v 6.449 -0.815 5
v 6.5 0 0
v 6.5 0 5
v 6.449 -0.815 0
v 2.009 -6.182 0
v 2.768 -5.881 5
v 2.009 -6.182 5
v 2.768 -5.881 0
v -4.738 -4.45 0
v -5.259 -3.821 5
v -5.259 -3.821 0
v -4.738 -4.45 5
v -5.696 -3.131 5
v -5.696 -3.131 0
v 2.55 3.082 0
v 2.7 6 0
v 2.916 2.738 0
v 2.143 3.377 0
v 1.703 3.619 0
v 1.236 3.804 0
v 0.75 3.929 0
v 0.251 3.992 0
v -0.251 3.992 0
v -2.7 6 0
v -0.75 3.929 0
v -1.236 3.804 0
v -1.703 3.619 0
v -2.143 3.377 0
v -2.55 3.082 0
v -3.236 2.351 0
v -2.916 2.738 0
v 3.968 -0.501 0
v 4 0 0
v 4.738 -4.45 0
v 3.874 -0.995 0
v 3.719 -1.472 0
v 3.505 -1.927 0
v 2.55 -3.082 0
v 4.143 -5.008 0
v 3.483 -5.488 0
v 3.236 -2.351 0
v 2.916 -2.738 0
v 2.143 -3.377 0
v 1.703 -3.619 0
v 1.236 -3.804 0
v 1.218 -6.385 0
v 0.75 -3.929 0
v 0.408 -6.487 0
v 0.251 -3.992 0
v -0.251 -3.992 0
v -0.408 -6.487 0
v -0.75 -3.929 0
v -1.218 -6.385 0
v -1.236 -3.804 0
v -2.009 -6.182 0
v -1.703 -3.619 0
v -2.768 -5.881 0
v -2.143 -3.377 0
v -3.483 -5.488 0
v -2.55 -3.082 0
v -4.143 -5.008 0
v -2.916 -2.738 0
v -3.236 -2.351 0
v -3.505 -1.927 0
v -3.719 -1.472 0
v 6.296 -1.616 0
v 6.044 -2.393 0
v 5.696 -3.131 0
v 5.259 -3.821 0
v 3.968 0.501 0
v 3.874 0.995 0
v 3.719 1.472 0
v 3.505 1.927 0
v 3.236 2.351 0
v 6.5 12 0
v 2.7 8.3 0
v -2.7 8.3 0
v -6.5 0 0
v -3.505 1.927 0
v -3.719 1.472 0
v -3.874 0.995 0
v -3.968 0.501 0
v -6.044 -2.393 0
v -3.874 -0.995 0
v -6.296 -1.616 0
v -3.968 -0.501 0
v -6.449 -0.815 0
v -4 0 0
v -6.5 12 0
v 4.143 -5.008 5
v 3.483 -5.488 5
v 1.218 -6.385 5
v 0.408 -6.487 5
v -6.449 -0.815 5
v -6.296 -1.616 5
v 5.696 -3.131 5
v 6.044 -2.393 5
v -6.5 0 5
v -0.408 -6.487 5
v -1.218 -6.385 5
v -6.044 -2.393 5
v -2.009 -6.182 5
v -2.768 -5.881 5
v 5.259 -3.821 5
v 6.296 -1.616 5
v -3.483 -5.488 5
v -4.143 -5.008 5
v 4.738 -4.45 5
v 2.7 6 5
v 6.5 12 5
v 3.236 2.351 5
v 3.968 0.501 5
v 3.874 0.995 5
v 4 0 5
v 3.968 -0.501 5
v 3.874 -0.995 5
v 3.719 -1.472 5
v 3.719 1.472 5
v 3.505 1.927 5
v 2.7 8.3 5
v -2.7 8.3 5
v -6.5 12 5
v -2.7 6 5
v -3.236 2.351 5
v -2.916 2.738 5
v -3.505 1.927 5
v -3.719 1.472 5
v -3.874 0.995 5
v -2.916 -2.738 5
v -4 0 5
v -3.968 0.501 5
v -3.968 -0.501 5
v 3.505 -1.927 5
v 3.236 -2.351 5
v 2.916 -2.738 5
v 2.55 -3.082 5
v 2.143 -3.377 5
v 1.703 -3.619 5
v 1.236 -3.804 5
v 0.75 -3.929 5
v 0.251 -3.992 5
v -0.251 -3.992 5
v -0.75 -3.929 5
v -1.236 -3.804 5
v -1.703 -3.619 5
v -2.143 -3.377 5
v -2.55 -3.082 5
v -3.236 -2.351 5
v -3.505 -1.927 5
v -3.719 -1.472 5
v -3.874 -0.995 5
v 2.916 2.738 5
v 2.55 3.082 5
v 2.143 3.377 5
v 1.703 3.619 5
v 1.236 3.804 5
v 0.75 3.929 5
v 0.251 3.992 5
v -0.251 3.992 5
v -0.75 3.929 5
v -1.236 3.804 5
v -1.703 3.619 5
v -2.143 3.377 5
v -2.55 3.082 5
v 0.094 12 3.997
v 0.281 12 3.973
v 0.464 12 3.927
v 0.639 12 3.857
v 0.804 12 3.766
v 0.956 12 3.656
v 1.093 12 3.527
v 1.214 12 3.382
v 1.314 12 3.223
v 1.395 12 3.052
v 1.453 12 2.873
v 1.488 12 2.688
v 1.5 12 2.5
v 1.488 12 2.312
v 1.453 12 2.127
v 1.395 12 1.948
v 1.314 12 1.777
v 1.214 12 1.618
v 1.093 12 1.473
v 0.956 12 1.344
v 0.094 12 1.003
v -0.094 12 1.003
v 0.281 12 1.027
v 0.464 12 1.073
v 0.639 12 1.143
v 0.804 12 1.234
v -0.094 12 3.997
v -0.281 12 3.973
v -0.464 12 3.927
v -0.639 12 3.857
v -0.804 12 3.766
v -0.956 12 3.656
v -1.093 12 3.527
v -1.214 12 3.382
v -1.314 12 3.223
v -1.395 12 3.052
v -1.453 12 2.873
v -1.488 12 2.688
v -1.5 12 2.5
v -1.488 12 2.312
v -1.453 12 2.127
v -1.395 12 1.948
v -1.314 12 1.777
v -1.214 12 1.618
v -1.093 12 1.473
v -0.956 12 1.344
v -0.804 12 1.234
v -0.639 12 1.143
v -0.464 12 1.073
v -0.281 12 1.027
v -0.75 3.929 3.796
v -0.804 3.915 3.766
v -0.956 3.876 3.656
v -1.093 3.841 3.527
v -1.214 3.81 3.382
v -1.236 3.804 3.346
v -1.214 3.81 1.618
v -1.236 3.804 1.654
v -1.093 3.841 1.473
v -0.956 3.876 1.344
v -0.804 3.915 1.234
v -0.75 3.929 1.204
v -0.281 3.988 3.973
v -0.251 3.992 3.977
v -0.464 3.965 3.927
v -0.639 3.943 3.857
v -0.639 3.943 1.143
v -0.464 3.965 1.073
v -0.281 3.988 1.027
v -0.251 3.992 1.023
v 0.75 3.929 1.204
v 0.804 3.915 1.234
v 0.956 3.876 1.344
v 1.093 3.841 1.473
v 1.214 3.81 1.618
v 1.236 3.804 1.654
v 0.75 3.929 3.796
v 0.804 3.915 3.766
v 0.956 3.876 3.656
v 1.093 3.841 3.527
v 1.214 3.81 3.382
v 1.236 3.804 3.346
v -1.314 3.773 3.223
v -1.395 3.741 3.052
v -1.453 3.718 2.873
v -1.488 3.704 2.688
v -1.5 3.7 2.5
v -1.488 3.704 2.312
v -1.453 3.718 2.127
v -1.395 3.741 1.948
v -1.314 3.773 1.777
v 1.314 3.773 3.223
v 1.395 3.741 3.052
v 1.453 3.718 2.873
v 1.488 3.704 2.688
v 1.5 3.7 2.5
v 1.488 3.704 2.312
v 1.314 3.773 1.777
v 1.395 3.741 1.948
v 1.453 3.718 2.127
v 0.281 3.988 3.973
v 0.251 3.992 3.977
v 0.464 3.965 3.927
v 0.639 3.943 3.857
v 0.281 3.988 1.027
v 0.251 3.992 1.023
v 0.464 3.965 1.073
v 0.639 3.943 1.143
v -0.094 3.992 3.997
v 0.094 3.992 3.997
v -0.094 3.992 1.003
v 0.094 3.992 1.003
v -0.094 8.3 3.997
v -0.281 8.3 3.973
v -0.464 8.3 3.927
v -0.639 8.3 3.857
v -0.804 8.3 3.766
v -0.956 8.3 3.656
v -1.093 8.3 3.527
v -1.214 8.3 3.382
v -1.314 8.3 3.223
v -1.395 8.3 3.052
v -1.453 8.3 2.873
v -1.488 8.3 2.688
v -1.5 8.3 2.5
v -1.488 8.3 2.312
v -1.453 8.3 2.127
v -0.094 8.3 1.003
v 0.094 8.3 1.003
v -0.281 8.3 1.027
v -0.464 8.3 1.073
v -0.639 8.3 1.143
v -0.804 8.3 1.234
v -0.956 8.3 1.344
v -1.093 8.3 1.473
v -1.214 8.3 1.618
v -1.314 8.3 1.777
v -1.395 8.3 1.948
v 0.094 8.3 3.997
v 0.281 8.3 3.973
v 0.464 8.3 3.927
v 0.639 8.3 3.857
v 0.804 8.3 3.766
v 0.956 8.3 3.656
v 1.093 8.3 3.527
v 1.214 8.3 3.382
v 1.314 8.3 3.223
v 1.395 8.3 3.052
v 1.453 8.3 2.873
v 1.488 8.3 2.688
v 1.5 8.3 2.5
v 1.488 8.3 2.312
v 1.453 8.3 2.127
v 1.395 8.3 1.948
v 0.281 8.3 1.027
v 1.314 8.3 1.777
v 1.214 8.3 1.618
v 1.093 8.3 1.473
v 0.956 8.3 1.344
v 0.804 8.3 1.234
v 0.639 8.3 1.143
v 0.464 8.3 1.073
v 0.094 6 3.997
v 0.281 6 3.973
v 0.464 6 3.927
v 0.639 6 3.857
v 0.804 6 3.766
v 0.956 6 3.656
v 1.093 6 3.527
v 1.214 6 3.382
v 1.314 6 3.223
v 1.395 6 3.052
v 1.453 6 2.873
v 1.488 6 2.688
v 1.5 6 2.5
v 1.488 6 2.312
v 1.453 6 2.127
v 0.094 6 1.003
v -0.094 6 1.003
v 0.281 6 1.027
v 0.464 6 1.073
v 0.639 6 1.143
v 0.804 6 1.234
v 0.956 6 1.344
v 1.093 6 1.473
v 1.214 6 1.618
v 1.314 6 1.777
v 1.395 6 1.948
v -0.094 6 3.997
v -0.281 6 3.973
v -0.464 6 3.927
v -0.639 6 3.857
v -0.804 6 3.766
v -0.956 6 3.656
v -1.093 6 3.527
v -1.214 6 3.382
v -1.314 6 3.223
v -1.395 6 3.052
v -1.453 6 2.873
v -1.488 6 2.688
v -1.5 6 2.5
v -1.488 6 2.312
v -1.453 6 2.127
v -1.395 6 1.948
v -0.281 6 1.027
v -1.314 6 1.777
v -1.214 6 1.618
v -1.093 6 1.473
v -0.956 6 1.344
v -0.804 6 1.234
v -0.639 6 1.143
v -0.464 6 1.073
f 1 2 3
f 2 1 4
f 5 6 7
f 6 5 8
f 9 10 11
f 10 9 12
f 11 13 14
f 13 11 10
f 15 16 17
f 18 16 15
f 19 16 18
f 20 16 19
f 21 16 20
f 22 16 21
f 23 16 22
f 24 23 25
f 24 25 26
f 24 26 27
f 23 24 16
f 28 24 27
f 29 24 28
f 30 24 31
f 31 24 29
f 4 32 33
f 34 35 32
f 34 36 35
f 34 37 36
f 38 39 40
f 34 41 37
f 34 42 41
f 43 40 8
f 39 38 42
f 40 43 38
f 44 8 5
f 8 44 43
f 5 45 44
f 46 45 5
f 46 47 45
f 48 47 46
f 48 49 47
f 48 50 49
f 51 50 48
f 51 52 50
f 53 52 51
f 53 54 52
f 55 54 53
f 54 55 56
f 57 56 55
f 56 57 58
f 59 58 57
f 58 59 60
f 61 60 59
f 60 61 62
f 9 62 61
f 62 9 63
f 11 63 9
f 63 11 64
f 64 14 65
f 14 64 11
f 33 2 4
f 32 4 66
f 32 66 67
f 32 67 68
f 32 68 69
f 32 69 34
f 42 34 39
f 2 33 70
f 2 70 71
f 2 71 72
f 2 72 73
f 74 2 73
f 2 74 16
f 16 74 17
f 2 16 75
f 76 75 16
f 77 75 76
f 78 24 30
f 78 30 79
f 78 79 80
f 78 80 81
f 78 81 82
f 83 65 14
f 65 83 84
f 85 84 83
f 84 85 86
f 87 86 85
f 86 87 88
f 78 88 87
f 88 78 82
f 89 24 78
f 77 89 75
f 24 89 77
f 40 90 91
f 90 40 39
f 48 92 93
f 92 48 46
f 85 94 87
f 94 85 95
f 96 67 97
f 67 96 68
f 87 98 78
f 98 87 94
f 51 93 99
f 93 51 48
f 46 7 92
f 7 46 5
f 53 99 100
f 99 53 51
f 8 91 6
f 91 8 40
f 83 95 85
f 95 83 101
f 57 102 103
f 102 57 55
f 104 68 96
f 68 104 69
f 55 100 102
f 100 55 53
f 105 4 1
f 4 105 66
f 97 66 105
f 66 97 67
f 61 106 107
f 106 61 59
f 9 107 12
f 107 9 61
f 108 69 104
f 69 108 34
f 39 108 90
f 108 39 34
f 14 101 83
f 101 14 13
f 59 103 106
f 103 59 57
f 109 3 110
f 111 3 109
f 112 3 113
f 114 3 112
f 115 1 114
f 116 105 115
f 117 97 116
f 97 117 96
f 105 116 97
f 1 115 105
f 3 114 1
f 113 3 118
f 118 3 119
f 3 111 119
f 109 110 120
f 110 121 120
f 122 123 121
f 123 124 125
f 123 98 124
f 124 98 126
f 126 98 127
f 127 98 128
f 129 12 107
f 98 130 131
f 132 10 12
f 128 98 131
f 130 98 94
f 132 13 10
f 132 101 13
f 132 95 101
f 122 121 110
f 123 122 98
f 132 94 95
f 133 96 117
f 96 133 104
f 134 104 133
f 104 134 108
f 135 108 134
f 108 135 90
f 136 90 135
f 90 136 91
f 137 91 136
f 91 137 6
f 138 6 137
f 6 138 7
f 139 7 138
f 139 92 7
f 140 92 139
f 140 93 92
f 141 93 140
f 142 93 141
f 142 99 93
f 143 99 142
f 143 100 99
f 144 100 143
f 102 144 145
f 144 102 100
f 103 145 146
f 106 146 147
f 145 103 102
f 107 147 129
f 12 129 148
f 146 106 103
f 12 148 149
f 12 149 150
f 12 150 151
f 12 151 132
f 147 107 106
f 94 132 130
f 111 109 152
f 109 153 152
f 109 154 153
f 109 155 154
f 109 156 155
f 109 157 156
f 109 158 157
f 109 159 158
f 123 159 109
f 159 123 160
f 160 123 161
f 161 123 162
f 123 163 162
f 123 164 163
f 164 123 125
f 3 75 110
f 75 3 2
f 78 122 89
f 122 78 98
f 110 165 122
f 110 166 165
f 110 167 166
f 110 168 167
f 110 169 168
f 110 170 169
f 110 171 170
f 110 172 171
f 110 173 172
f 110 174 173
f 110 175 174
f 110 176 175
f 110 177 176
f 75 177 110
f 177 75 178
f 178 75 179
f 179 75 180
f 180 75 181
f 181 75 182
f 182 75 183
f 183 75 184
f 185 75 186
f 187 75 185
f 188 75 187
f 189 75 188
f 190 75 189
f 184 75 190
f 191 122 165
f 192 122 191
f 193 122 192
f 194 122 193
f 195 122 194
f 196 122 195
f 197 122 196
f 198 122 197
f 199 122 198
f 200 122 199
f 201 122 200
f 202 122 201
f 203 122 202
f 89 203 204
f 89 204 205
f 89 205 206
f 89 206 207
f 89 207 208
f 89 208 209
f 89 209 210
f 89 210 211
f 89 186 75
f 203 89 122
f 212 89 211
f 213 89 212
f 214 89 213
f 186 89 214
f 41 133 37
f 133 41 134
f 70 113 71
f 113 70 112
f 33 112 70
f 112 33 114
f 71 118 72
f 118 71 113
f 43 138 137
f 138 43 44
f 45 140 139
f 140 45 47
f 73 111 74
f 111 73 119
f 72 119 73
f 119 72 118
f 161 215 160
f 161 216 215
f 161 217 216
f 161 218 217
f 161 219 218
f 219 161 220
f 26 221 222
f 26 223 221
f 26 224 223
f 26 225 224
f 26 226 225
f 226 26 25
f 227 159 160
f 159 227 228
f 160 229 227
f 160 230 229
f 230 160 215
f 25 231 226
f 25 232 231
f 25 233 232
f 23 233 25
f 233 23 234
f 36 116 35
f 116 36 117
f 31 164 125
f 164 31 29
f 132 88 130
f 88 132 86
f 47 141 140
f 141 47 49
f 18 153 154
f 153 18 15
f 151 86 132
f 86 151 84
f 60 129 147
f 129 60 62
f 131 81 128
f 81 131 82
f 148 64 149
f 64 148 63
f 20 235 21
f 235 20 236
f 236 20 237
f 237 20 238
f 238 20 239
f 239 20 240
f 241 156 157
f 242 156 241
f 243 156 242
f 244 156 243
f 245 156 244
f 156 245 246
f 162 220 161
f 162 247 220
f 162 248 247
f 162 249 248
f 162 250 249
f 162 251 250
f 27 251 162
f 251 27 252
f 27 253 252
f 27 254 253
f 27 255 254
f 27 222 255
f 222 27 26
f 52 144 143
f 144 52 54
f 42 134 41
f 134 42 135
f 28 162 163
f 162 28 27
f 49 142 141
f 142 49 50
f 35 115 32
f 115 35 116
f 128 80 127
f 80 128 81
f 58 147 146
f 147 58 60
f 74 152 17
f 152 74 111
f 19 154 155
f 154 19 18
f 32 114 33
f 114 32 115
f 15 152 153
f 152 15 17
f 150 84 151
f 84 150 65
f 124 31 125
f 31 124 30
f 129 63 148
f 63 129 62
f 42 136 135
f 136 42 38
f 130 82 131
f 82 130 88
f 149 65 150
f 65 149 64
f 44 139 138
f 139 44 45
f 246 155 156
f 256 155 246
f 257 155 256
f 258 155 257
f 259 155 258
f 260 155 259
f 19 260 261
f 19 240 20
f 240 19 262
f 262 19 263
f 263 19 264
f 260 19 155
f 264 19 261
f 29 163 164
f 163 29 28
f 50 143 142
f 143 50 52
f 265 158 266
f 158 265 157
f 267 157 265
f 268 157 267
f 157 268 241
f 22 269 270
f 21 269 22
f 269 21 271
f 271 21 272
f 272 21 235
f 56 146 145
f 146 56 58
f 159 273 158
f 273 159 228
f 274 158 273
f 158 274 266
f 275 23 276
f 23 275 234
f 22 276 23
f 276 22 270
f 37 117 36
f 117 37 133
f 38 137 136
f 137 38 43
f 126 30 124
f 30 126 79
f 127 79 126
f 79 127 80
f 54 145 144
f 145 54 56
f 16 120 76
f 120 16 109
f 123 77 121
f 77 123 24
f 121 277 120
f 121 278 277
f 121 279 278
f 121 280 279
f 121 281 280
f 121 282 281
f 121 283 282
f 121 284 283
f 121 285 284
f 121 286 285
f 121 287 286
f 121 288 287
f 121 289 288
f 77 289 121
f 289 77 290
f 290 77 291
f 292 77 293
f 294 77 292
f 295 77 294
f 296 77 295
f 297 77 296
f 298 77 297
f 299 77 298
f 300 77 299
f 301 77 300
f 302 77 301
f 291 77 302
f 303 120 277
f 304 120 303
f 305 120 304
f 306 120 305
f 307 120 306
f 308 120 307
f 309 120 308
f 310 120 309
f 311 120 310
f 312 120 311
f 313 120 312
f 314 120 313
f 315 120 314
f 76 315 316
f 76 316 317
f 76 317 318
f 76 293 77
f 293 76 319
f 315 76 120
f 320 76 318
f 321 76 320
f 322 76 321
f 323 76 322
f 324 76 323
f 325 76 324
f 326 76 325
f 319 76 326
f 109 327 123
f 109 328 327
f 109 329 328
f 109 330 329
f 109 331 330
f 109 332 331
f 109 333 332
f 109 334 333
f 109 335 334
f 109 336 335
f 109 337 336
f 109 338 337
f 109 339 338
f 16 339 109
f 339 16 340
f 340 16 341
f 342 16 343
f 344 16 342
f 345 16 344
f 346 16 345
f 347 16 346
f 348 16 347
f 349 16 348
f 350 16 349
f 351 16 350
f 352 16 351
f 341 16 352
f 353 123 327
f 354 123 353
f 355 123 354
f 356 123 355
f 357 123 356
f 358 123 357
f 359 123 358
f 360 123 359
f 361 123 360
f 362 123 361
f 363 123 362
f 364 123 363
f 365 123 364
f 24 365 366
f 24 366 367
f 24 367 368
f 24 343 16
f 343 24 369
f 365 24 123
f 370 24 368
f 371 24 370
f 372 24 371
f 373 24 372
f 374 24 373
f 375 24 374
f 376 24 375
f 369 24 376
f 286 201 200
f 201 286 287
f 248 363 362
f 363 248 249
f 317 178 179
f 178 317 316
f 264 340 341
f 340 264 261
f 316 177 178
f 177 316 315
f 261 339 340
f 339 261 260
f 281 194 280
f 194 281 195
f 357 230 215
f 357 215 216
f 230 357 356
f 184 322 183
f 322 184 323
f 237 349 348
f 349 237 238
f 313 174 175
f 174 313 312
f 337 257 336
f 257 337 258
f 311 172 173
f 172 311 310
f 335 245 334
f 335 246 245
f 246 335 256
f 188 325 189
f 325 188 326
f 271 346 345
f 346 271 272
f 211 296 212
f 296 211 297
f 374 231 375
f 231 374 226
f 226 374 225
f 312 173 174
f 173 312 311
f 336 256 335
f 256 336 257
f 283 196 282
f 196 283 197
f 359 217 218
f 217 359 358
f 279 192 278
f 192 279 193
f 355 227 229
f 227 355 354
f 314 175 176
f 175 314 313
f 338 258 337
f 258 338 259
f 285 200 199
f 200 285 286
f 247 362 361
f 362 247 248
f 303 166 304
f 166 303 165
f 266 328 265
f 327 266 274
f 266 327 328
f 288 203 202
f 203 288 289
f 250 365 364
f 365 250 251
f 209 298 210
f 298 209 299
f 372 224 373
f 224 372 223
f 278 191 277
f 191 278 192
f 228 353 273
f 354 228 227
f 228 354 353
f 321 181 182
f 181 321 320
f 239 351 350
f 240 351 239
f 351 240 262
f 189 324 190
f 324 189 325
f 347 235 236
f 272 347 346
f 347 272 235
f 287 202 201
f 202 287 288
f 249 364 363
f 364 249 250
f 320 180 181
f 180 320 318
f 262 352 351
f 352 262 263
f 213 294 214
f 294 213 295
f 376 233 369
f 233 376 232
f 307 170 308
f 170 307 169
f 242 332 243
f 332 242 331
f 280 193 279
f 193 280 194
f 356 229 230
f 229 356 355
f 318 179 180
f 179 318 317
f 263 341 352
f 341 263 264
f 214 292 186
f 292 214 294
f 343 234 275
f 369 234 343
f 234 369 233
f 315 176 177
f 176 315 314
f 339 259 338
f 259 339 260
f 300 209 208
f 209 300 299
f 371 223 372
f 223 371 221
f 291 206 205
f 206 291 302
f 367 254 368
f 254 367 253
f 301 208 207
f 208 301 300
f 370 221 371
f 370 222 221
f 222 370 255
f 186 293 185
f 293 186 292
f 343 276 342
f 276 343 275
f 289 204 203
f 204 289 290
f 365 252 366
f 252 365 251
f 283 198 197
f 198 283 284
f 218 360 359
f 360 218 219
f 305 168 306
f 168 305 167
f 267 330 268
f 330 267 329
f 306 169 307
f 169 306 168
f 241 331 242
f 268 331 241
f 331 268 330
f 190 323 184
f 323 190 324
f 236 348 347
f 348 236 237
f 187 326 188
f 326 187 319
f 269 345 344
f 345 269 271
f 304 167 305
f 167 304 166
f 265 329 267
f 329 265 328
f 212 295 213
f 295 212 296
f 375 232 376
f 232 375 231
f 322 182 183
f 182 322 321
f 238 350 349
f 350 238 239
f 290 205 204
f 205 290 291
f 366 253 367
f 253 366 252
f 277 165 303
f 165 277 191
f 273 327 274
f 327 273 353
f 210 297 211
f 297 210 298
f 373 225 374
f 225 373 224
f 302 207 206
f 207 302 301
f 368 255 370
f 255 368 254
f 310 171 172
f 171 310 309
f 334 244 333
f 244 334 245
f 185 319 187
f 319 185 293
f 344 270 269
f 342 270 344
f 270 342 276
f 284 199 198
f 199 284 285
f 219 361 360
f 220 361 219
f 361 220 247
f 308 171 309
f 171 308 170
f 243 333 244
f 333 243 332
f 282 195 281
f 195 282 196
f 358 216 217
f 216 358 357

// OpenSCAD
// Bar clamp
// Glyn Cowles April 2019

// Diameter of hole for bolt 
boltDiam=3; 
// Width of slot for nut
nutWidth=5.4;
// Height of slot for nut
nutHeight=2.3;
// Height of clamp
ht=5; 
// Diameter of outer circle
diam=13;
// Diameter of bar
barDiam=8;
// Length of nut holder
holdY=12;
// Resolution
$fn=50; 
//--------------------------------------------------------------

rodClamp();

//--------------------------------------------------------------
module rodClamp() {
    difference() {
        union() {
            cylinder(d=diam,h=ht);
            translate([-diam/2,0,0]) cube([diam,holdY,ht]);
        }
            cylinder(d=barDiam,h=ht);
            translate([-nutWidth/2,holdY/2,0]) cube([nutWidth,nutHeight,ht]);
            #translate([0,0,ht/2]) rotate([-90,0,0]) cylinder(d=boltDiam,h=holdY);
    }
}
